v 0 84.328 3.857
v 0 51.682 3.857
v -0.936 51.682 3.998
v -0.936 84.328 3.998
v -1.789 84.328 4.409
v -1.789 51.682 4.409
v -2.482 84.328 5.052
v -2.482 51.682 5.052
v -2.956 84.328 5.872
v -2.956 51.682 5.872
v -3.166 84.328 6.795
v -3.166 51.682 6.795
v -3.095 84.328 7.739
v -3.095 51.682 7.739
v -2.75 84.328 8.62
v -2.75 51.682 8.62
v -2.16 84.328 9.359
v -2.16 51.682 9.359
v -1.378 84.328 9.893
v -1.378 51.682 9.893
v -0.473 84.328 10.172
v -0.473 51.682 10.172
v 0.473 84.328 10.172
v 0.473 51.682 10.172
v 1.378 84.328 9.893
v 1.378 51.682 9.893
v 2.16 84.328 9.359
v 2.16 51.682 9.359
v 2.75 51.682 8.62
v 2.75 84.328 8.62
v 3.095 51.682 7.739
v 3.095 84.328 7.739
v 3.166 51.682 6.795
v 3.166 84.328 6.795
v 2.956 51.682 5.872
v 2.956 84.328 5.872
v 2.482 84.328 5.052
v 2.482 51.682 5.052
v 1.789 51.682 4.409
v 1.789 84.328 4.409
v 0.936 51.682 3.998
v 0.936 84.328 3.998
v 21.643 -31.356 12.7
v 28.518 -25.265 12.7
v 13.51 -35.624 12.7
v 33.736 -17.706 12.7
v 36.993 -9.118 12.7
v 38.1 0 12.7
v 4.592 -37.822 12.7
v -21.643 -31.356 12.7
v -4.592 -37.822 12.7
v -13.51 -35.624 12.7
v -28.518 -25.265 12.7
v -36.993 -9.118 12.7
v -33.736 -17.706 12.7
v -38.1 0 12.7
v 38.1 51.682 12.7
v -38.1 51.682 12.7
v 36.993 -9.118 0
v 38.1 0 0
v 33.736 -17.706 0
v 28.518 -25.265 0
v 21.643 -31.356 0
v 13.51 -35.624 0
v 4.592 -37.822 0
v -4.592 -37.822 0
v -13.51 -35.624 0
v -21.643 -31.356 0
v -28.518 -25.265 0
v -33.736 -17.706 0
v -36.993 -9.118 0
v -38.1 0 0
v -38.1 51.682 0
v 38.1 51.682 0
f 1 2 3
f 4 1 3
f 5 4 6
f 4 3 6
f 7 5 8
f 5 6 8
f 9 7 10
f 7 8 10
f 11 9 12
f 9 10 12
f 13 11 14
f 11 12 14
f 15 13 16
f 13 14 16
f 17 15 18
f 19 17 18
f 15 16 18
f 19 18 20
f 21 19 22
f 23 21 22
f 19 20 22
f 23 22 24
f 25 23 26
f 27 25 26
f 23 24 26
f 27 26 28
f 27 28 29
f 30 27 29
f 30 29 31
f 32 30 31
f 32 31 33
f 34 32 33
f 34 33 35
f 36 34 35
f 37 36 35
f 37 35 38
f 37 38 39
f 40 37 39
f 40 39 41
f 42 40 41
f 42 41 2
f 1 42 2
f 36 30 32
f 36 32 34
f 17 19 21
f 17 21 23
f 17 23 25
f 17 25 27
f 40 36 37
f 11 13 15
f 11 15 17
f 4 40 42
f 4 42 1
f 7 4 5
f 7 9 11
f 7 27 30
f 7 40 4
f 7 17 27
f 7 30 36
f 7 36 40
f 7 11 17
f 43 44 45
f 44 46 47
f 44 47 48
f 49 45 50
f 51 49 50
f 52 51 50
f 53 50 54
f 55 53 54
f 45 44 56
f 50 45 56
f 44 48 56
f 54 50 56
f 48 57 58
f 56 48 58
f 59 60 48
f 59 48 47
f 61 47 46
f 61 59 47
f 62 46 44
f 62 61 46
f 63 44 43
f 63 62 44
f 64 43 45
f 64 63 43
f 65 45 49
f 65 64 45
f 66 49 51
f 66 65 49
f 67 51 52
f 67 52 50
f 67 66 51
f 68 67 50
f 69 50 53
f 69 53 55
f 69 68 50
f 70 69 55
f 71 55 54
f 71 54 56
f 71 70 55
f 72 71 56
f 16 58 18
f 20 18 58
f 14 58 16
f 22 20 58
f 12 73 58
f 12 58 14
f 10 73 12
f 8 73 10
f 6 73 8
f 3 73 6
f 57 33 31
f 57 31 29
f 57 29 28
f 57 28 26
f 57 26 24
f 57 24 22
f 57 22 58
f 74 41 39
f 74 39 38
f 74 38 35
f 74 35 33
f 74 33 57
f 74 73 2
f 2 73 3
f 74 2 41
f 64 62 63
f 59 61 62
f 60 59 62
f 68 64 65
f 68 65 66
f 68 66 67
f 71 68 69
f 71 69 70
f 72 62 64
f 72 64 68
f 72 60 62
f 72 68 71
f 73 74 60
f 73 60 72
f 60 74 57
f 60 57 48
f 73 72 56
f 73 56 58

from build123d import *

# Parameters (mm, degrees)
BOSS_EXTRUDE1_DEPTH = 12.7
SKETCH2_R           = 3.175
BOSS_EXTRUDE2_DEPTH = 84.328


with BuildPart() as part:
    # Sketch1 → Boss-Extrude1 (new body)
    with BuildSketch(Plane.XY):
        with BuildLine():
            Line((-38.1, 0), (-38.1, 51.682449807))
            Line((-38.1, 51.682449807), (38.1, 51.682449807))
            Line((38.1, 51.682449807), (38.1, 0))
            ThreePointArc((38.1, 0), (0, -38.1), (-38.1, 0))
        make_face()
    extrude(amount=BOSS_EXTRUDE1_DEPTH)

    # Sketch2 → Boss-Extrude2 (add)
    with BuildSketch(Plane(origin=(0, 0, 0), x_dir=(1, 0, 0), z_dir=(0, 1, 0))):
        with Locations(Location((0, -7.032046272, 0), (0, 0, 90))):
            Circle(SKETCH2_R)
    extrude(amount=BOSS_EXTRUDE2_DEPTH)


solid = part.part
